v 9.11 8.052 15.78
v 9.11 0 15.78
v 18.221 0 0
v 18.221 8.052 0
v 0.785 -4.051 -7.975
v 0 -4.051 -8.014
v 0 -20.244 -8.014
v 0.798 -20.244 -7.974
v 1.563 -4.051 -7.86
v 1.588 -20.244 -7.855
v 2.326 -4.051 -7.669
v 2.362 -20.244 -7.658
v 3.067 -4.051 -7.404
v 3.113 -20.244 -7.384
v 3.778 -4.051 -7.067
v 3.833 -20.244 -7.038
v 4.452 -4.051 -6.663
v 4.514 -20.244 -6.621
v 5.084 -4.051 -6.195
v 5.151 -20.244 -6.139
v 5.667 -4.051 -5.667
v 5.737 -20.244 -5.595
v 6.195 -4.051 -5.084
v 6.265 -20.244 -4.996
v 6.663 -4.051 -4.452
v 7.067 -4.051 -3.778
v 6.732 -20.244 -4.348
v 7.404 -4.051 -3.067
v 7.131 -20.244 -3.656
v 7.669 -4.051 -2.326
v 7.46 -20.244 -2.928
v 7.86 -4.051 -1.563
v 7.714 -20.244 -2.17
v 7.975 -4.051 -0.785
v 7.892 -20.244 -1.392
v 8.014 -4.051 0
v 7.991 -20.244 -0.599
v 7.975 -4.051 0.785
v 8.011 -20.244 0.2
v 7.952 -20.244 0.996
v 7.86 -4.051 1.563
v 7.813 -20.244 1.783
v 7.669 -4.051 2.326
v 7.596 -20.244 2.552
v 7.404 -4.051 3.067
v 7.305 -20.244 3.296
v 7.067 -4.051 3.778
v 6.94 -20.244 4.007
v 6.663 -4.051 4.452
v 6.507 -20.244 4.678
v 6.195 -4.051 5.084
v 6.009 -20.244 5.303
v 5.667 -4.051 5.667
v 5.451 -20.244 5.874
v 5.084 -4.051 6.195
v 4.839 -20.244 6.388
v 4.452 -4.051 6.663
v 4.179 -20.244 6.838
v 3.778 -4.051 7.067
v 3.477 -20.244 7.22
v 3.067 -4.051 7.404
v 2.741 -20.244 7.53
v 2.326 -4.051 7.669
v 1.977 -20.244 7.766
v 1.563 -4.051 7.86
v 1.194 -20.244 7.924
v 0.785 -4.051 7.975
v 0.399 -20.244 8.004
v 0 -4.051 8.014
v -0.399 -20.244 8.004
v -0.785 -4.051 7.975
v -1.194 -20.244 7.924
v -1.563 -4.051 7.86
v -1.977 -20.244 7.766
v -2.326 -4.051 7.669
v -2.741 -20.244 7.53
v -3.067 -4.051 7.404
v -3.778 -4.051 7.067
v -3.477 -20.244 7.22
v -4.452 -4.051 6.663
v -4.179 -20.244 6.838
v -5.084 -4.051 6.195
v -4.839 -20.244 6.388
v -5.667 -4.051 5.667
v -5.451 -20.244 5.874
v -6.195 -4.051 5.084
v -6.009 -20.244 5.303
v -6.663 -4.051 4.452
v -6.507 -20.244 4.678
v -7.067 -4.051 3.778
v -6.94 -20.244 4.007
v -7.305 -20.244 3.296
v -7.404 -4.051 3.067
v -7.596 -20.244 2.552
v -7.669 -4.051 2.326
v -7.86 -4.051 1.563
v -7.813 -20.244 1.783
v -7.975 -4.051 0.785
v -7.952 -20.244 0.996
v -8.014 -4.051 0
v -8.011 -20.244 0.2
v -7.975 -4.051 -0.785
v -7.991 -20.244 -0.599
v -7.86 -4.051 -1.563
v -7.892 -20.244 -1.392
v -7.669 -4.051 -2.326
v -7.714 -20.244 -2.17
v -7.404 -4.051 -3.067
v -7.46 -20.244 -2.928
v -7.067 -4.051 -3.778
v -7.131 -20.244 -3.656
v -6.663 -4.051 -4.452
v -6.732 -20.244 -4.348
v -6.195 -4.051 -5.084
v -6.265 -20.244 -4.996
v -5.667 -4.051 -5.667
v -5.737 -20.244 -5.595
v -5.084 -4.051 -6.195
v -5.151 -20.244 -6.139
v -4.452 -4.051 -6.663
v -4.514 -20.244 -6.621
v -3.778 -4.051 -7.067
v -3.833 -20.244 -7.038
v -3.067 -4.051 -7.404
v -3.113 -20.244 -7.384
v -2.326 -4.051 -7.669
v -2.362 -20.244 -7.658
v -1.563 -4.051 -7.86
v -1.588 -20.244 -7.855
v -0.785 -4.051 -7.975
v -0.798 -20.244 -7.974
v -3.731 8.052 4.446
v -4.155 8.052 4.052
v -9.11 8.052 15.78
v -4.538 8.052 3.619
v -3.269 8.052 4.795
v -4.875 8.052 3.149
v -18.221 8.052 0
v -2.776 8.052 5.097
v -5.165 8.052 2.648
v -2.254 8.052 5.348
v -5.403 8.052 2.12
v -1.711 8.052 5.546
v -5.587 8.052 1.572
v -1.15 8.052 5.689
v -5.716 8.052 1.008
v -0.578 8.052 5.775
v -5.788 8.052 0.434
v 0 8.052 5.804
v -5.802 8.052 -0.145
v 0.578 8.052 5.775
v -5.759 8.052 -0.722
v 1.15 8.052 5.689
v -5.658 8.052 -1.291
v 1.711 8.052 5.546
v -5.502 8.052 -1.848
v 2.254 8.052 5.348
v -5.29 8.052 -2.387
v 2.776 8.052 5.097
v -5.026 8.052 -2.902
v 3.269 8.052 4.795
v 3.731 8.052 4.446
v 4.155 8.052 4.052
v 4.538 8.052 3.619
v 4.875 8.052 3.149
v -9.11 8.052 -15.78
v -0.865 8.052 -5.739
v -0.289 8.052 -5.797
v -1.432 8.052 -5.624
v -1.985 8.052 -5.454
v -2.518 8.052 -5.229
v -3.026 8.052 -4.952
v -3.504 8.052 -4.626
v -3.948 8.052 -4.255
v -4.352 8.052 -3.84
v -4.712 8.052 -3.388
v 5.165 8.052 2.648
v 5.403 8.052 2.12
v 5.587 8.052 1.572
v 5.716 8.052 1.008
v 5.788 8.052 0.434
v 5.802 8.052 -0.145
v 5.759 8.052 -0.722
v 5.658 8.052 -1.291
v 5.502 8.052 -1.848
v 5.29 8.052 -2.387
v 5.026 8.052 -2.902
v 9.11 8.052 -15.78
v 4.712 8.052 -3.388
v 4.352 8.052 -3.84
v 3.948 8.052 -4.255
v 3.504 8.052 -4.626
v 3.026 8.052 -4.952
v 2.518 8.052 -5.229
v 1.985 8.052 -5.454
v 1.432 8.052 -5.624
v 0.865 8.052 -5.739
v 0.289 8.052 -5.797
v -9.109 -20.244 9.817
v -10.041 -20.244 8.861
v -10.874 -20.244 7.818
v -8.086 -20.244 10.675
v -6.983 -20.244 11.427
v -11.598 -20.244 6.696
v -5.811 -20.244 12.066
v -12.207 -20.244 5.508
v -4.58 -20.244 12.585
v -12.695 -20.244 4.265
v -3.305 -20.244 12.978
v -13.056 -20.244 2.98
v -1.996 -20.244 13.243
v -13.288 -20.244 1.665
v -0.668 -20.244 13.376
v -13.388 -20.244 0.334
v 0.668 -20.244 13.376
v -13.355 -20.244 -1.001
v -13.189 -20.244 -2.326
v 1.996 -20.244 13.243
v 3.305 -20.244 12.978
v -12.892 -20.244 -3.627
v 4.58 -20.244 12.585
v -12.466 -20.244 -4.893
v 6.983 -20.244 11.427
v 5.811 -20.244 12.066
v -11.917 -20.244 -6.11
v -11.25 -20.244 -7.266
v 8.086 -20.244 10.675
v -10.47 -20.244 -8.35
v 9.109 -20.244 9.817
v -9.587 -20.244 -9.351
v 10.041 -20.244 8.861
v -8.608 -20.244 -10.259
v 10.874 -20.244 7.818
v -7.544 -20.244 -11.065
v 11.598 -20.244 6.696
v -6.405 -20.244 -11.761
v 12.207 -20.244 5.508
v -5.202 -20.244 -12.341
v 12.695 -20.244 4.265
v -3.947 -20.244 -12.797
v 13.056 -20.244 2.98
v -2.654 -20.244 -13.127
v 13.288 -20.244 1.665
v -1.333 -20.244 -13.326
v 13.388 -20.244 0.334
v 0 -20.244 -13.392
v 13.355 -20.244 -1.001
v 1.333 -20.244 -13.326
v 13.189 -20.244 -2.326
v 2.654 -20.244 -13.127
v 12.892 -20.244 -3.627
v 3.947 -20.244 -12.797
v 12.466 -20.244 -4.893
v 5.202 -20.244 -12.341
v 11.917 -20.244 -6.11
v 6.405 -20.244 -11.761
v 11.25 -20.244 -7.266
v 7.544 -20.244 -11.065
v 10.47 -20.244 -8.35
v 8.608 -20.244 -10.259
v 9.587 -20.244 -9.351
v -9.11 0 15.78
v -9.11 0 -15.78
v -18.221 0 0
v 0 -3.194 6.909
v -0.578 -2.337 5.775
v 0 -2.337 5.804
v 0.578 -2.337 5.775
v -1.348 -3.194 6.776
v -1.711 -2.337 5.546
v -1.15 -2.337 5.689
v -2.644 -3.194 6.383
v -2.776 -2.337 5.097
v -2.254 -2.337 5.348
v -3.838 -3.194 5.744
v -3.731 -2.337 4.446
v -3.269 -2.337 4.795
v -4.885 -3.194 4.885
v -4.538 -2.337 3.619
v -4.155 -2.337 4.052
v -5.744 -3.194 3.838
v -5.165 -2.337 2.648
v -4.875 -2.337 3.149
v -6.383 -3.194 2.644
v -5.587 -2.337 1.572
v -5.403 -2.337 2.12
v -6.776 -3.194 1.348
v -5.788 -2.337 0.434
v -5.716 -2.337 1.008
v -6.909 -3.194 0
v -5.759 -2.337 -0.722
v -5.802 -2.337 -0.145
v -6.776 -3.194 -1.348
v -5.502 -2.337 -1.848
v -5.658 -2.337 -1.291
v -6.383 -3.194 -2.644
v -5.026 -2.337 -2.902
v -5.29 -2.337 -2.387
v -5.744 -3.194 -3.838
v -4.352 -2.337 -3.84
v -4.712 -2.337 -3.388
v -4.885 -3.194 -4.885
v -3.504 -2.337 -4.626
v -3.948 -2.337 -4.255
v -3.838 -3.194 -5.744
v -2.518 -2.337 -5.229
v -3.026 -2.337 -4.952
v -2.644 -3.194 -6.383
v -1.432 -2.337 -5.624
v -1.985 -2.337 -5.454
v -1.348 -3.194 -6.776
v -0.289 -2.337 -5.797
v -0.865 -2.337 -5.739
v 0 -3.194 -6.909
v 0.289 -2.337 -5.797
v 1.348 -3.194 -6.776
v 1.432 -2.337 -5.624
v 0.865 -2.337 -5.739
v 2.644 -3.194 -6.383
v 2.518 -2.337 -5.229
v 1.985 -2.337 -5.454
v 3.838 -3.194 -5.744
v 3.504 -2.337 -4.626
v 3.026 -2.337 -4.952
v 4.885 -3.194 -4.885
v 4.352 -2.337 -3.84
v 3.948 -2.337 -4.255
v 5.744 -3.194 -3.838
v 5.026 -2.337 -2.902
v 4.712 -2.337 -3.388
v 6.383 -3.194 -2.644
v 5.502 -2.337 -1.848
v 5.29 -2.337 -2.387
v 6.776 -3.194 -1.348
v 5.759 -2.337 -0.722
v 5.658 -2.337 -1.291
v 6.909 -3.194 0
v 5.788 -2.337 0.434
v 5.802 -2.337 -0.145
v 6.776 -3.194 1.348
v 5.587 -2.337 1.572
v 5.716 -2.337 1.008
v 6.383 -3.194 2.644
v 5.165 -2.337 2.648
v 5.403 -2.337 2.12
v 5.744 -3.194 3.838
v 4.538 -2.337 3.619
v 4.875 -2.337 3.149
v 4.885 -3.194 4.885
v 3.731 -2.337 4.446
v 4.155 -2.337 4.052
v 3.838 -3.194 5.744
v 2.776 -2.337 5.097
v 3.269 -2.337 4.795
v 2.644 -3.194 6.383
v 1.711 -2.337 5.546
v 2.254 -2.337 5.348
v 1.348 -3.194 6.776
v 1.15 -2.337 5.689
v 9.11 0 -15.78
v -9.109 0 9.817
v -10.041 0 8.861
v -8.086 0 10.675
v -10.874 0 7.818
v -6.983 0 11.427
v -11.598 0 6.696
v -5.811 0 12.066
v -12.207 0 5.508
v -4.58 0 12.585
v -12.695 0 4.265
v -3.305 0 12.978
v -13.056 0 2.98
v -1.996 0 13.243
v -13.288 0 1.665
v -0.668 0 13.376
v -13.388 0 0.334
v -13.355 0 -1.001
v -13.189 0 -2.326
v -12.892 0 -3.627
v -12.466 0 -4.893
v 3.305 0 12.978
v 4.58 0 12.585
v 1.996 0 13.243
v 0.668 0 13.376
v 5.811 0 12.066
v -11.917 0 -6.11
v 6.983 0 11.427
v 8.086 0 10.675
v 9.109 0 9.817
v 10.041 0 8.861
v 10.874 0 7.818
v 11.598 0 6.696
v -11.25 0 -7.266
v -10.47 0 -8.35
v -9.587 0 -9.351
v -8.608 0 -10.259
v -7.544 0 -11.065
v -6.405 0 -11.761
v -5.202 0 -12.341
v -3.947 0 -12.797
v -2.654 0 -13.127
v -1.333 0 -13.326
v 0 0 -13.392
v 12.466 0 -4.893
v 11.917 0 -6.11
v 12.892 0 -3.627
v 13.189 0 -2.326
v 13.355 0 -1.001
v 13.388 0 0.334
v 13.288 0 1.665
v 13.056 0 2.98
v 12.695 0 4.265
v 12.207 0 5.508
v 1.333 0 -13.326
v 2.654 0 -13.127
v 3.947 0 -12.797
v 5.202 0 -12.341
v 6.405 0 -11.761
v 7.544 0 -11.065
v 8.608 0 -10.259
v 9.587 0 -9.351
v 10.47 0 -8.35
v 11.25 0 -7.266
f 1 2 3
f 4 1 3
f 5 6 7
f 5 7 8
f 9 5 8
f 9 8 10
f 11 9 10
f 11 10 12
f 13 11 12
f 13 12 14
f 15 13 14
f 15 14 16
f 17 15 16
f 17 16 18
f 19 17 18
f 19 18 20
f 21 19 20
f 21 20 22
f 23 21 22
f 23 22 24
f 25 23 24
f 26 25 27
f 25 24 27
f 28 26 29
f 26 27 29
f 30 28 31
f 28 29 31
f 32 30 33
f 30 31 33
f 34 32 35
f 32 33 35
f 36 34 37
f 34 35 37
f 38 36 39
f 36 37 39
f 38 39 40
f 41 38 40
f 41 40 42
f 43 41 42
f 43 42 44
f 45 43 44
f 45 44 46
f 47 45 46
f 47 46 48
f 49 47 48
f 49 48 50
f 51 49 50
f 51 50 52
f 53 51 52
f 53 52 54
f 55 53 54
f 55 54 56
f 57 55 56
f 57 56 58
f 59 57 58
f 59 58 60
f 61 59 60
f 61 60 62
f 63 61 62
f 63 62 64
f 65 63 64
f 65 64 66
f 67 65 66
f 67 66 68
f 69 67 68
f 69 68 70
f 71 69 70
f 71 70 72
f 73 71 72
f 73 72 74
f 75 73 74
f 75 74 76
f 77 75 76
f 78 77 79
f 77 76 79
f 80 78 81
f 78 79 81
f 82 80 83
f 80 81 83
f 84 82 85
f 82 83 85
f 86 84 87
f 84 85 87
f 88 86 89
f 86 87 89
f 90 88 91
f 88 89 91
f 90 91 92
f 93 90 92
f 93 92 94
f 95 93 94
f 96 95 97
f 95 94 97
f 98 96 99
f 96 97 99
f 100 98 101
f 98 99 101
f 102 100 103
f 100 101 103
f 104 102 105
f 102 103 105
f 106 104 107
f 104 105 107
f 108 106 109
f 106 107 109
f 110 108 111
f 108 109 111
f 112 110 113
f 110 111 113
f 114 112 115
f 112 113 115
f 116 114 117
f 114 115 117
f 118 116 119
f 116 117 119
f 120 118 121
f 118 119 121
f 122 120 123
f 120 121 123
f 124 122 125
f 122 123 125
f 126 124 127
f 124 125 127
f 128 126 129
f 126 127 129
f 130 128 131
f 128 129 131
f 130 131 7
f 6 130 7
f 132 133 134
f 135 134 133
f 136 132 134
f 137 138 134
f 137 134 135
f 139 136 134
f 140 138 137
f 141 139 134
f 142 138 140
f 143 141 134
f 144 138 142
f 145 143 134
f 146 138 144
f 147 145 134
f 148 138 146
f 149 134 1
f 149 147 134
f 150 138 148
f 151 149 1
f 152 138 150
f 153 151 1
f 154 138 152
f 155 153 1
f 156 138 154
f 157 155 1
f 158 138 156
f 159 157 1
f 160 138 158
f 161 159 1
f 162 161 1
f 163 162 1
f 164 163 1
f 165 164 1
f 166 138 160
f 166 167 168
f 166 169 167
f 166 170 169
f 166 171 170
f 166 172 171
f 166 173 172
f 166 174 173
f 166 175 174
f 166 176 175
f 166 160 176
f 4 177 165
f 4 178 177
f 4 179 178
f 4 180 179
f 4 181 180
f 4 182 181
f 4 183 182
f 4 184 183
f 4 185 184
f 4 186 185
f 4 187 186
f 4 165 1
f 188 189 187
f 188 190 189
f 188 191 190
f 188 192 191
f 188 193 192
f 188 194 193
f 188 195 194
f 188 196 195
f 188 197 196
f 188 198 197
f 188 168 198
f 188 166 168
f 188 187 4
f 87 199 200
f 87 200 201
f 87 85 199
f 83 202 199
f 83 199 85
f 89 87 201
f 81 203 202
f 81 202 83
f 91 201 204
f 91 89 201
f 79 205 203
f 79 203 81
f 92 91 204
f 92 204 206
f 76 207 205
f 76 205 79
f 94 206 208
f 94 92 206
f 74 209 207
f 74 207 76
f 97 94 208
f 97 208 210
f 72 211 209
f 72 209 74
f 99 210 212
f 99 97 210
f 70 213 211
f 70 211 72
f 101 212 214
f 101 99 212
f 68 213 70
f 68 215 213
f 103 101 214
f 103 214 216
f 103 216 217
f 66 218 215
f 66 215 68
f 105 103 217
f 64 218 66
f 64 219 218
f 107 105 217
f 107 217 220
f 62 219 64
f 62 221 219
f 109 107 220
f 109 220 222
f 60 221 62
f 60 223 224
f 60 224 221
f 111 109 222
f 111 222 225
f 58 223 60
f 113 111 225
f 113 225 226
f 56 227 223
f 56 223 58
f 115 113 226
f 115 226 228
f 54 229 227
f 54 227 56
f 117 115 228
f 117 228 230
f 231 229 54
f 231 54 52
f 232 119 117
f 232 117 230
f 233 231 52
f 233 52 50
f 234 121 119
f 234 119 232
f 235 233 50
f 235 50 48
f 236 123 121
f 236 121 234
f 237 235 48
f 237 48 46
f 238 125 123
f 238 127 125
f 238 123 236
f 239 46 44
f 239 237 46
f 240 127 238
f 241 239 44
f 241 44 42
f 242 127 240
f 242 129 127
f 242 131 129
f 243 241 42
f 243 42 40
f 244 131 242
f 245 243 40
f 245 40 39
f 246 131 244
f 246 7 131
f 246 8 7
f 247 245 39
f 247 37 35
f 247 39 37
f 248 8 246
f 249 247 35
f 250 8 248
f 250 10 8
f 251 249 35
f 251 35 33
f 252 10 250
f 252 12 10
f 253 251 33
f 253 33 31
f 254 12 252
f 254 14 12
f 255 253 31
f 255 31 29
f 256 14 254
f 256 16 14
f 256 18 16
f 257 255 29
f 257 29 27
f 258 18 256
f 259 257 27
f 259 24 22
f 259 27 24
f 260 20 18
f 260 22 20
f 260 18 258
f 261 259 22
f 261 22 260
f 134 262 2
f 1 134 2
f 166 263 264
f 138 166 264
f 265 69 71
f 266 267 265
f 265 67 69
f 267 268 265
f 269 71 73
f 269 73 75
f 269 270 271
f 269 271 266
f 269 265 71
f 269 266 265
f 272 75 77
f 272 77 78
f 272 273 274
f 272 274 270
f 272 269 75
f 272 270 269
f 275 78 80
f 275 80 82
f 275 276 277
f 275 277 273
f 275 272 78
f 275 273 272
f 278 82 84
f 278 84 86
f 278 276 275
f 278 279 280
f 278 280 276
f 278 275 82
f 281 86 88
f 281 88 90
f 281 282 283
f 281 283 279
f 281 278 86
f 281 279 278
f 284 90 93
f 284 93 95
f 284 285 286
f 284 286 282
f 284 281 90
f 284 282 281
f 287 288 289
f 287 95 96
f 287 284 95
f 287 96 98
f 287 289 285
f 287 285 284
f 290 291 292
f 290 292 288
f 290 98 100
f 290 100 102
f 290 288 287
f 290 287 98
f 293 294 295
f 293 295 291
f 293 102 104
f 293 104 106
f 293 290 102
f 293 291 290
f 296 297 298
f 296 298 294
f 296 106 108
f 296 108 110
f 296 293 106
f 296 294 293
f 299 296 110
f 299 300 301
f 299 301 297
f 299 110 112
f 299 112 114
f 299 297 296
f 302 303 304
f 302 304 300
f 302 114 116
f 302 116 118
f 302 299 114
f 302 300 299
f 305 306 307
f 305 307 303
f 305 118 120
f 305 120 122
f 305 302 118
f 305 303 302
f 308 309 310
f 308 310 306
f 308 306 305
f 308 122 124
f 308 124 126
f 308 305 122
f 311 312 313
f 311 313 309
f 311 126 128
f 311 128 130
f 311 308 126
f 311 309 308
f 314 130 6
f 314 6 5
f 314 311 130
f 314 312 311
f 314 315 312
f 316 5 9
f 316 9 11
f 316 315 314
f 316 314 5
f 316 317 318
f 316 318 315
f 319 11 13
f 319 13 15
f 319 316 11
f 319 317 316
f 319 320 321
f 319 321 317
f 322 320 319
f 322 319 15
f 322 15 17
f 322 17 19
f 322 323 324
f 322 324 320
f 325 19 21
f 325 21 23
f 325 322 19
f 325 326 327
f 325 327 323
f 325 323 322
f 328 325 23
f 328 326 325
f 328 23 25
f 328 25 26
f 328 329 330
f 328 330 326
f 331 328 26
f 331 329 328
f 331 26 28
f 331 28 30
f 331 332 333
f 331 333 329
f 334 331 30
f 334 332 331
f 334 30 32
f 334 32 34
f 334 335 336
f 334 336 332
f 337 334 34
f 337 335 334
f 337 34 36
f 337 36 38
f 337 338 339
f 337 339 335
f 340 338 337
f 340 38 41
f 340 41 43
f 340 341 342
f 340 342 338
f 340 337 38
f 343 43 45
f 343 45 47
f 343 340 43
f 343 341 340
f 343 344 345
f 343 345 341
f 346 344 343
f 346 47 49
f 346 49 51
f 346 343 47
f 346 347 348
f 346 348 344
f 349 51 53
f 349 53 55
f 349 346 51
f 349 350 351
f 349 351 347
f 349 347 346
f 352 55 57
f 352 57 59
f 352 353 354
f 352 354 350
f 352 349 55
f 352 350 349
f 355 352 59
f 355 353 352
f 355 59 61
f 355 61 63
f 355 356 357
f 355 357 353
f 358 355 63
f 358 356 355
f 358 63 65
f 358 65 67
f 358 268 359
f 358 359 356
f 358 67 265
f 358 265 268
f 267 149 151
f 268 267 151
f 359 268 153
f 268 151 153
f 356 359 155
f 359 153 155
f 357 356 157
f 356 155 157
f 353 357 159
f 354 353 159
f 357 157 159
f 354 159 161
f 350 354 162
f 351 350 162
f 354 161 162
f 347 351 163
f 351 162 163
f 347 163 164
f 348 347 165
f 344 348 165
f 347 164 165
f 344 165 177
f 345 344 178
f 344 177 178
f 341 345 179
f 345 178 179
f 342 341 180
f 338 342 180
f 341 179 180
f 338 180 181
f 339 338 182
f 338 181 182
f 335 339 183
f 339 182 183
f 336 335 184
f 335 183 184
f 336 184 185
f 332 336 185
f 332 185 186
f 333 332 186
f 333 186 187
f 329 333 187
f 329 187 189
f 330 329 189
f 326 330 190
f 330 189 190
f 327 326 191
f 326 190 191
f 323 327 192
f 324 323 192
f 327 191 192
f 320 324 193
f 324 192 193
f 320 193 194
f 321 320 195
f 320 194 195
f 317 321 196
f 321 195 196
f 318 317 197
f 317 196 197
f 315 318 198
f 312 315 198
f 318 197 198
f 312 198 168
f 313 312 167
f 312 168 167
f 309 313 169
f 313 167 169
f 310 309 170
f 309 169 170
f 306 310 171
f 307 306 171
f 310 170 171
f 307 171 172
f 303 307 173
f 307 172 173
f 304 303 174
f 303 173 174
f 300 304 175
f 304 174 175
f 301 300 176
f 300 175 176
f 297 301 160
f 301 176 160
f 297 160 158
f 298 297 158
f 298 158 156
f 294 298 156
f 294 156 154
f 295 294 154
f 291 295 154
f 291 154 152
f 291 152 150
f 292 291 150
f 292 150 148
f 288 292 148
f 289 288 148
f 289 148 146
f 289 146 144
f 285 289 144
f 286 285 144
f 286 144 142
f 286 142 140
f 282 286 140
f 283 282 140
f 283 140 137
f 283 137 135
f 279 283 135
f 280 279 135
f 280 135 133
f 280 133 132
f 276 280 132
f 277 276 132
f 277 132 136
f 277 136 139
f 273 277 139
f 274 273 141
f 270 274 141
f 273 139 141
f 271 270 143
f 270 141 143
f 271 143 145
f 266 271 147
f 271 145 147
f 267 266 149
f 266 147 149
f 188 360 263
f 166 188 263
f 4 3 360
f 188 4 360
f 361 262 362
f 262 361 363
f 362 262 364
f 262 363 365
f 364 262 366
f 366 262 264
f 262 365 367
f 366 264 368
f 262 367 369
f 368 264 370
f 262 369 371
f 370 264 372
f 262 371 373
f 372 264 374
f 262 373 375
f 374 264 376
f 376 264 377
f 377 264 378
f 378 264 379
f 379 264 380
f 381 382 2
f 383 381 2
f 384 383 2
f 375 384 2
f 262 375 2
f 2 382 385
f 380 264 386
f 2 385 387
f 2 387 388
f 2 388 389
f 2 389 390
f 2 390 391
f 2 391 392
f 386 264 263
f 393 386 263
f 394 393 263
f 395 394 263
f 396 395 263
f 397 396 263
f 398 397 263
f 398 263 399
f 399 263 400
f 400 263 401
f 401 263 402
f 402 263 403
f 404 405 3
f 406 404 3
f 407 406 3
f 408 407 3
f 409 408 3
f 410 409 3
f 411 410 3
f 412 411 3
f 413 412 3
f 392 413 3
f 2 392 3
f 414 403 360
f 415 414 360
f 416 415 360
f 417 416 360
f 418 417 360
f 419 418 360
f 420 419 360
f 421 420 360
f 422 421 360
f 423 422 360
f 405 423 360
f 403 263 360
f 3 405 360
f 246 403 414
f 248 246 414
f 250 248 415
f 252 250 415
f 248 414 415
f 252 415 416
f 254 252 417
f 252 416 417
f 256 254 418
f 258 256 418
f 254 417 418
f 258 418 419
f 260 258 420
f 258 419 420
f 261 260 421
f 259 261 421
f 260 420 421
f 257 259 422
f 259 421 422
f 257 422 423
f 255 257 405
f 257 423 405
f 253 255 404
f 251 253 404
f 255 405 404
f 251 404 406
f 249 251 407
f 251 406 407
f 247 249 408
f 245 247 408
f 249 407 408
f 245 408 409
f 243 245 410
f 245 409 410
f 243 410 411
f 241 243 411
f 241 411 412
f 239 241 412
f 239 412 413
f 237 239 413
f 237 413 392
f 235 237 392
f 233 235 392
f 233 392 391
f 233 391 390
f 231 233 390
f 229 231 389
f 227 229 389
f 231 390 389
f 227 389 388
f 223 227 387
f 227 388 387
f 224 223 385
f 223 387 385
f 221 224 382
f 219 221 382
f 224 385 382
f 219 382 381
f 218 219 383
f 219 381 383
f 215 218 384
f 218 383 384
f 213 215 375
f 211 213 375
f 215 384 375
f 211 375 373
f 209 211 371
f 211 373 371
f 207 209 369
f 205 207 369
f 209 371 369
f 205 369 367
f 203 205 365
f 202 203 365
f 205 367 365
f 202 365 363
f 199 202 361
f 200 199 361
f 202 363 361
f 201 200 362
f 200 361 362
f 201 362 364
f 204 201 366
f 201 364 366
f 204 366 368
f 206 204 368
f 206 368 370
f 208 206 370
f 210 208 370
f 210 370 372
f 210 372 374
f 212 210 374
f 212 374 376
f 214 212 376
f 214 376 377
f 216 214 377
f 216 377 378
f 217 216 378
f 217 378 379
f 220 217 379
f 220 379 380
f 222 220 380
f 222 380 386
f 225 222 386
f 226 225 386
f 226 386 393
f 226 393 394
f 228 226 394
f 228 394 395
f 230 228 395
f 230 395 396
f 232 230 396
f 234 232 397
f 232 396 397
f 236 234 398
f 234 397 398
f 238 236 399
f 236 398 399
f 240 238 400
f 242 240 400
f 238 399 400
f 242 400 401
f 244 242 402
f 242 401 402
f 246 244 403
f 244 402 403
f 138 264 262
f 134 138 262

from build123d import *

# Parameters (mm, degrees)
BOSS_EXTRUDE1_DEPTH = 8.0518
SKETCH2_R           = 13.39215
BOSS_EXTRUDE2_DEPTH = 20.2438
SKETCH3_R           = 5.8039
CUT_EXTRUDE1_DEPTH  = 10.3886
SKETCH4_R           = 8.0137
CUT_EXTRUDE2_DEPTH  = 16.1925


with BuildPart() as part:
    # Sketch1 → Boss-Extrude1 (new body)
    with BuildSketch(Plane(origin=(0, 0, 0), x_dir=(1, 0, 0), z_dir=(0, 1, 0))):
        Polygon((18.22088582, 0), (9.11044291, 15.77975), (-9.11044291, 15.77975), (-18.22088582, 0), (-9.11044291, -15.77975), (9.11044291, -15.77975), align=None)
    extrude(amount=BOSS_EXTRUDE1_DEPTH)

    # Sketch2 → Boss-Extrude2 (add)
    with BuildSketch(Plane(origin=(0, 0, 0), x_dir=(-1, 0, 0), z_dir=(0, -1, 0))):
        with Locations(Location((0, 0, 0), (0, 0, 90))):
            Circle(SKETCH2_R)
    extrude(amount=BOSS_EXTRUDE2_DEPTH)

    # Sketch3 → Cut-Extrude1 (cut)
    with BuildSketch(Plane(origin=(0, 8.0518, 0), x_dir=(1, 0, 0), z_dir=(0, 1, 0))):
        with Locations(Location((0, 0, 0), (0, 0, 270))):
            Circle(SKETCH3_R)
    extrude(amount=-CUT_EXTRUDE1_DEPTH, mode=Mode.SUBTRACT)

    # Sketch4 → Cut-Extrude2 (cut)
    with BuildSketch(Plane.XZ.offset(20.2438)):
        with Locations(Location((0, 0, 0), (0, 0, 270))):
            Circle(SKETCH4_R)
    extrude(amount=-CUT_EXTRUDE2_DEPTH, mode=Mode.SUBTRACT)

    # Sketch5 → Cut-Revolve4 (revolve, cut)
    with BuildSketch(Plane.XY, mode=Mode.PRIVATE) as cut_revolve4_sk:
        Polygon((0, -2.3368), (0, -4.0513), (-8.0137, -4.0513), (-5.8039, -2.3368), align=None)
    revolve(cut_revolve4_sk.sketch.rotate(Axis((0, -2.3368, 0), (0, -1, 0)), 270), axis=Axis((0, -2.3368, 0), (0, -1, 0)), mode=Mode.SUBTRACT)


solid = part.part
